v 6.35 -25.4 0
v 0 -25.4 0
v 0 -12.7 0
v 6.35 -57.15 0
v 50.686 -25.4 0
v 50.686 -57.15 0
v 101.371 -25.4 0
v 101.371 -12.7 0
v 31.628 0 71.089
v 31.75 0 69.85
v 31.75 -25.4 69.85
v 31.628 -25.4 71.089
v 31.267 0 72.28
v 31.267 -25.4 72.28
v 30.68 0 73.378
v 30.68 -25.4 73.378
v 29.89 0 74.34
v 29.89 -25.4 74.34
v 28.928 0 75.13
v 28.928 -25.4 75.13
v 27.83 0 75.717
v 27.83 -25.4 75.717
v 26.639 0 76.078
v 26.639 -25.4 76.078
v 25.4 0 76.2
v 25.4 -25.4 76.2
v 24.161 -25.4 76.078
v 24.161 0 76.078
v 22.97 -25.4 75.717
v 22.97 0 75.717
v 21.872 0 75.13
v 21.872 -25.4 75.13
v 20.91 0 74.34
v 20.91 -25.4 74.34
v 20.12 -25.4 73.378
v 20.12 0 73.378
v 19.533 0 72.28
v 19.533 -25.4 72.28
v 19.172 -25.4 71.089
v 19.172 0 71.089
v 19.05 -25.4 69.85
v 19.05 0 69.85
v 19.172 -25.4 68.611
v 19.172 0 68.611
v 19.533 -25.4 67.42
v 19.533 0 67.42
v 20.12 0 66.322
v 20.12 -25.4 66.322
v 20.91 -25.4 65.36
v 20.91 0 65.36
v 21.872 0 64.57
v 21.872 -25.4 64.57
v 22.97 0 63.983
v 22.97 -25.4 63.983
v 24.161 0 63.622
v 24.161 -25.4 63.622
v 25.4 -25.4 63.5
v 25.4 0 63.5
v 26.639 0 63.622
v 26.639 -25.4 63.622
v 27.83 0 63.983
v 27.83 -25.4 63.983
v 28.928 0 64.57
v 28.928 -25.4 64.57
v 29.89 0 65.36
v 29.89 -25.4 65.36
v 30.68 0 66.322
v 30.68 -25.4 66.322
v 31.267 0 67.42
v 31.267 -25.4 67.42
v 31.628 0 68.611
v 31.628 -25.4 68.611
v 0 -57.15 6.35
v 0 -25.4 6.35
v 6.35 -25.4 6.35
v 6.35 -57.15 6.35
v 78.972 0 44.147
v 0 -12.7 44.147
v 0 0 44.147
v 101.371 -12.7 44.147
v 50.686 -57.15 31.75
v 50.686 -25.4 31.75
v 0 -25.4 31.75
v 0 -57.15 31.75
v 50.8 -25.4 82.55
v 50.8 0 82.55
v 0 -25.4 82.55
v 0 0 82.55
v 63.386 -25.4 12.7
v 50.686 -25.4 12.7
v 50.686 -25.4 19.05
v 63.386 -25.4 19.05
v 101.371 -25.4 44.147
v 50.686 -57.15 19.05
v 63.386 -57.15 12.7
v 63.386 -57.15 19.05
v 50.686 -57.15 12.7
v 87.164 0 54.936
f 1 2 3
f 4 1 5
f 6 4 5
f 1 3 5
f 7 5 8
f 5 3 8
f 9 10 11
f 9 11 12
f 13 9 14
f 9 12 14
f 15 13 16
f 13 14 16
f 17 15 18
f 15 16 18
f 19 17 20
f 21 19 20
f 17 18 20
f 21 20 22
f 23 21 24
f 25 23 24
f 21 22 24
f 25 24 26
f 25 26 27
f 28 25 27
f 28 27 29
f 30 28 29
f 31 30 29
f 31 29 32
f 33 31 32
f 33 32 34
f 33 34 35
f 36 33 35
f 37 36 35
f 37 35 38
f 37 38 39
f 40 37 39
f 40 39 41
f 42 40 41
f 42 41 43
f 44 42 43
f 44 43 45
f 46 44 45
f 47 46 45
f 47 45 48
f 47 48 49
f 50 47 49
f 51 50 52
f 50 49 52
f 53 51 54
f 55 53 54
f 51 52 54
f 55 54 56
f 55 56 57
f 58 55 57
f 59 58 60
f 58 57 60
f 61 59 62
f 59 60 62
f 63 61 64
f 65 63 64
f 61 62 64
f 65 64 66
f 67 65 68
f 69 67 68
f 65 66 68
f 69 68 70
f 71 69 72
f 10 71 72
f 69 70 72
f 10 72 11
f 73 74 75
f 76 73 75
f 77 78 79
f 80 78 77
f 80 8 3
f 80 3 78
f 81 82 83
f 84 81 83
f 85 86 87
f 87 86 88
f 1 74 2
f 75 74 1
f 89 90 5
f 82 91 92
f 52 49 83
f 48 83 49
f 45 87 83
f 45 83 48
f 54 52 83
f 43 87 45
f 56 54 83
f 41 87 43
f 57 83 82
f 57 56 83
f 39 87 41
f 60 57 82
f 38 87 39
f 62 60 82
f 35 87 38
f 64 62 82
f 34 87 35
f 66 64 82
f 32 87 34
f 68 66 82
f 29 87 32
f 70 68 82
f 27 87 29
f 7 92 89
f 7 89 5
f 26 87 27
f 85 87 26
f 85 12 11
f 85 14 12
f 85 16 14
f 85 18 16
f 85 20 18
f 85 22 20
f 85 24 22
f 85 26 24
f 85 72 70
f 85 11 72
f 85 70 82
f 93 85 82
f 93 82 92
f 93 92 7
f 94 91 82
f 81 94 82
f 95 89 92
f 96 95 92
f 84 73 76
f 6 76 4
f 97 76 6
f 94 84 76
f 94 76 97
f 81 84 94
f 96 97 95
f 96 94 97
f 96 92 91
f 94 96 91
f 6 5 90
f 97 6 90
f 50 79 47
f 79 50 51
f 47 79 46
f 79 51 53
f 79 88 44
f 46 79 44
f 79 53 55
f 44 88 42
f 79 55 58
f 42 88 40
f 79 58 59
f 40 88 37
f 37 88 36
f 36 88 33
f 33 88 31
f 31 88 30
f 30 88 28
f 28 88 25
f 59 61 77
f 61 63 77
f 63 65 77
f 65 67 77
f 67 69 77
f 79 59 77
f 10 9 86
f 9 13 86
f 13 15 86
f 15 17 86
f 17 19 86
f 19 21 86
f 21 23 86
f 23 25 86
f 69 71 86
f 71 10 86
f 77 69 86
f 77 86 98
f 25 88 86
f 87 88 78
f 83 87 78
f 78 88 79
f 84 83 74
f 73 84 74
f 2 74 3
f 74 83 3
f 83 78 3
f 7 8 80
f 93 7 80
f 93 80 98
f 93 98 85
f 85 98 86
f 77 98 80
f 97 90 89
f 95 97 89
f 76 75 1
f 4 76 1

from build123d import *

# Parameters (mm, degrees)
F1_DEPTH = 25.4
F3_DEPTH = 96.466142
F4_W     = 12.7
F4_H     = 44.147057
F5_DEPTH = 101.372375
F6_R     = 6.35
F7_DEPTH = 25.401
F9_DEPTH = 31.75


with BuildPart() as f1:
    # F0 (on Front) → F1 (new body)
    with BuildSketch(Plane.XZ):
        Polygon((0, 82.55), (0, 0), (101.371375, 0), (101.371375, 44.147057), (50.8, 82.55), align=None)
    extrude(amount=F1_DEPTH)

    # F2 (on face) → F3 (cut, through all)
    with BuildSketch(Plane(origin=(58.339296, 0, 76.824801), x_dir=(0.7964, 0, -0.604771), z_dir=(0.604771, 0, 0.7964))):
        Polygon((36.194164, 0), (54.033275, -12.7), (54.033275, 0), align=None)
    extrude(amount=-F3_DEPTH, mode=Mode.SUBTRACT)

    # F4 (on face) → F5 (cut, through all)
    with BuildSketch(Plane.YZ.offset(101.371375)):
        with Locations((-6.35, 22.073528)):
            Rectangle(F4_W, F4_H)
    extrude(amount=-F5_DEPTH, mode=Mode.SUBTRACT)

    # F6 (on face) → F7 (cut, through all)
    with BuildSketch(Plane.XZ.offset(25.4)):
        with Locations((25.4, 69.85)):
            Circle(F6_R)
    extrude(amount=-F7_DEPTH, mode=Mode.SUBTRACT)

    # F8 (on face) → F9 (join)
    with BuildSketch(Plane.XZ.offset(25.4)):
        Polygon((50.685688, 31.75), (0, 31.75), (0, 6.35), (6.35, 6.35), (6.35, 0), (50.685688, 0), (50.685688, 12.7), (63.385688, 12.7), (63.385688, 19.05), (50.685688, 19.05), align=None)
    extrude(amount=F9_DEPTH)


solid = f1.part
